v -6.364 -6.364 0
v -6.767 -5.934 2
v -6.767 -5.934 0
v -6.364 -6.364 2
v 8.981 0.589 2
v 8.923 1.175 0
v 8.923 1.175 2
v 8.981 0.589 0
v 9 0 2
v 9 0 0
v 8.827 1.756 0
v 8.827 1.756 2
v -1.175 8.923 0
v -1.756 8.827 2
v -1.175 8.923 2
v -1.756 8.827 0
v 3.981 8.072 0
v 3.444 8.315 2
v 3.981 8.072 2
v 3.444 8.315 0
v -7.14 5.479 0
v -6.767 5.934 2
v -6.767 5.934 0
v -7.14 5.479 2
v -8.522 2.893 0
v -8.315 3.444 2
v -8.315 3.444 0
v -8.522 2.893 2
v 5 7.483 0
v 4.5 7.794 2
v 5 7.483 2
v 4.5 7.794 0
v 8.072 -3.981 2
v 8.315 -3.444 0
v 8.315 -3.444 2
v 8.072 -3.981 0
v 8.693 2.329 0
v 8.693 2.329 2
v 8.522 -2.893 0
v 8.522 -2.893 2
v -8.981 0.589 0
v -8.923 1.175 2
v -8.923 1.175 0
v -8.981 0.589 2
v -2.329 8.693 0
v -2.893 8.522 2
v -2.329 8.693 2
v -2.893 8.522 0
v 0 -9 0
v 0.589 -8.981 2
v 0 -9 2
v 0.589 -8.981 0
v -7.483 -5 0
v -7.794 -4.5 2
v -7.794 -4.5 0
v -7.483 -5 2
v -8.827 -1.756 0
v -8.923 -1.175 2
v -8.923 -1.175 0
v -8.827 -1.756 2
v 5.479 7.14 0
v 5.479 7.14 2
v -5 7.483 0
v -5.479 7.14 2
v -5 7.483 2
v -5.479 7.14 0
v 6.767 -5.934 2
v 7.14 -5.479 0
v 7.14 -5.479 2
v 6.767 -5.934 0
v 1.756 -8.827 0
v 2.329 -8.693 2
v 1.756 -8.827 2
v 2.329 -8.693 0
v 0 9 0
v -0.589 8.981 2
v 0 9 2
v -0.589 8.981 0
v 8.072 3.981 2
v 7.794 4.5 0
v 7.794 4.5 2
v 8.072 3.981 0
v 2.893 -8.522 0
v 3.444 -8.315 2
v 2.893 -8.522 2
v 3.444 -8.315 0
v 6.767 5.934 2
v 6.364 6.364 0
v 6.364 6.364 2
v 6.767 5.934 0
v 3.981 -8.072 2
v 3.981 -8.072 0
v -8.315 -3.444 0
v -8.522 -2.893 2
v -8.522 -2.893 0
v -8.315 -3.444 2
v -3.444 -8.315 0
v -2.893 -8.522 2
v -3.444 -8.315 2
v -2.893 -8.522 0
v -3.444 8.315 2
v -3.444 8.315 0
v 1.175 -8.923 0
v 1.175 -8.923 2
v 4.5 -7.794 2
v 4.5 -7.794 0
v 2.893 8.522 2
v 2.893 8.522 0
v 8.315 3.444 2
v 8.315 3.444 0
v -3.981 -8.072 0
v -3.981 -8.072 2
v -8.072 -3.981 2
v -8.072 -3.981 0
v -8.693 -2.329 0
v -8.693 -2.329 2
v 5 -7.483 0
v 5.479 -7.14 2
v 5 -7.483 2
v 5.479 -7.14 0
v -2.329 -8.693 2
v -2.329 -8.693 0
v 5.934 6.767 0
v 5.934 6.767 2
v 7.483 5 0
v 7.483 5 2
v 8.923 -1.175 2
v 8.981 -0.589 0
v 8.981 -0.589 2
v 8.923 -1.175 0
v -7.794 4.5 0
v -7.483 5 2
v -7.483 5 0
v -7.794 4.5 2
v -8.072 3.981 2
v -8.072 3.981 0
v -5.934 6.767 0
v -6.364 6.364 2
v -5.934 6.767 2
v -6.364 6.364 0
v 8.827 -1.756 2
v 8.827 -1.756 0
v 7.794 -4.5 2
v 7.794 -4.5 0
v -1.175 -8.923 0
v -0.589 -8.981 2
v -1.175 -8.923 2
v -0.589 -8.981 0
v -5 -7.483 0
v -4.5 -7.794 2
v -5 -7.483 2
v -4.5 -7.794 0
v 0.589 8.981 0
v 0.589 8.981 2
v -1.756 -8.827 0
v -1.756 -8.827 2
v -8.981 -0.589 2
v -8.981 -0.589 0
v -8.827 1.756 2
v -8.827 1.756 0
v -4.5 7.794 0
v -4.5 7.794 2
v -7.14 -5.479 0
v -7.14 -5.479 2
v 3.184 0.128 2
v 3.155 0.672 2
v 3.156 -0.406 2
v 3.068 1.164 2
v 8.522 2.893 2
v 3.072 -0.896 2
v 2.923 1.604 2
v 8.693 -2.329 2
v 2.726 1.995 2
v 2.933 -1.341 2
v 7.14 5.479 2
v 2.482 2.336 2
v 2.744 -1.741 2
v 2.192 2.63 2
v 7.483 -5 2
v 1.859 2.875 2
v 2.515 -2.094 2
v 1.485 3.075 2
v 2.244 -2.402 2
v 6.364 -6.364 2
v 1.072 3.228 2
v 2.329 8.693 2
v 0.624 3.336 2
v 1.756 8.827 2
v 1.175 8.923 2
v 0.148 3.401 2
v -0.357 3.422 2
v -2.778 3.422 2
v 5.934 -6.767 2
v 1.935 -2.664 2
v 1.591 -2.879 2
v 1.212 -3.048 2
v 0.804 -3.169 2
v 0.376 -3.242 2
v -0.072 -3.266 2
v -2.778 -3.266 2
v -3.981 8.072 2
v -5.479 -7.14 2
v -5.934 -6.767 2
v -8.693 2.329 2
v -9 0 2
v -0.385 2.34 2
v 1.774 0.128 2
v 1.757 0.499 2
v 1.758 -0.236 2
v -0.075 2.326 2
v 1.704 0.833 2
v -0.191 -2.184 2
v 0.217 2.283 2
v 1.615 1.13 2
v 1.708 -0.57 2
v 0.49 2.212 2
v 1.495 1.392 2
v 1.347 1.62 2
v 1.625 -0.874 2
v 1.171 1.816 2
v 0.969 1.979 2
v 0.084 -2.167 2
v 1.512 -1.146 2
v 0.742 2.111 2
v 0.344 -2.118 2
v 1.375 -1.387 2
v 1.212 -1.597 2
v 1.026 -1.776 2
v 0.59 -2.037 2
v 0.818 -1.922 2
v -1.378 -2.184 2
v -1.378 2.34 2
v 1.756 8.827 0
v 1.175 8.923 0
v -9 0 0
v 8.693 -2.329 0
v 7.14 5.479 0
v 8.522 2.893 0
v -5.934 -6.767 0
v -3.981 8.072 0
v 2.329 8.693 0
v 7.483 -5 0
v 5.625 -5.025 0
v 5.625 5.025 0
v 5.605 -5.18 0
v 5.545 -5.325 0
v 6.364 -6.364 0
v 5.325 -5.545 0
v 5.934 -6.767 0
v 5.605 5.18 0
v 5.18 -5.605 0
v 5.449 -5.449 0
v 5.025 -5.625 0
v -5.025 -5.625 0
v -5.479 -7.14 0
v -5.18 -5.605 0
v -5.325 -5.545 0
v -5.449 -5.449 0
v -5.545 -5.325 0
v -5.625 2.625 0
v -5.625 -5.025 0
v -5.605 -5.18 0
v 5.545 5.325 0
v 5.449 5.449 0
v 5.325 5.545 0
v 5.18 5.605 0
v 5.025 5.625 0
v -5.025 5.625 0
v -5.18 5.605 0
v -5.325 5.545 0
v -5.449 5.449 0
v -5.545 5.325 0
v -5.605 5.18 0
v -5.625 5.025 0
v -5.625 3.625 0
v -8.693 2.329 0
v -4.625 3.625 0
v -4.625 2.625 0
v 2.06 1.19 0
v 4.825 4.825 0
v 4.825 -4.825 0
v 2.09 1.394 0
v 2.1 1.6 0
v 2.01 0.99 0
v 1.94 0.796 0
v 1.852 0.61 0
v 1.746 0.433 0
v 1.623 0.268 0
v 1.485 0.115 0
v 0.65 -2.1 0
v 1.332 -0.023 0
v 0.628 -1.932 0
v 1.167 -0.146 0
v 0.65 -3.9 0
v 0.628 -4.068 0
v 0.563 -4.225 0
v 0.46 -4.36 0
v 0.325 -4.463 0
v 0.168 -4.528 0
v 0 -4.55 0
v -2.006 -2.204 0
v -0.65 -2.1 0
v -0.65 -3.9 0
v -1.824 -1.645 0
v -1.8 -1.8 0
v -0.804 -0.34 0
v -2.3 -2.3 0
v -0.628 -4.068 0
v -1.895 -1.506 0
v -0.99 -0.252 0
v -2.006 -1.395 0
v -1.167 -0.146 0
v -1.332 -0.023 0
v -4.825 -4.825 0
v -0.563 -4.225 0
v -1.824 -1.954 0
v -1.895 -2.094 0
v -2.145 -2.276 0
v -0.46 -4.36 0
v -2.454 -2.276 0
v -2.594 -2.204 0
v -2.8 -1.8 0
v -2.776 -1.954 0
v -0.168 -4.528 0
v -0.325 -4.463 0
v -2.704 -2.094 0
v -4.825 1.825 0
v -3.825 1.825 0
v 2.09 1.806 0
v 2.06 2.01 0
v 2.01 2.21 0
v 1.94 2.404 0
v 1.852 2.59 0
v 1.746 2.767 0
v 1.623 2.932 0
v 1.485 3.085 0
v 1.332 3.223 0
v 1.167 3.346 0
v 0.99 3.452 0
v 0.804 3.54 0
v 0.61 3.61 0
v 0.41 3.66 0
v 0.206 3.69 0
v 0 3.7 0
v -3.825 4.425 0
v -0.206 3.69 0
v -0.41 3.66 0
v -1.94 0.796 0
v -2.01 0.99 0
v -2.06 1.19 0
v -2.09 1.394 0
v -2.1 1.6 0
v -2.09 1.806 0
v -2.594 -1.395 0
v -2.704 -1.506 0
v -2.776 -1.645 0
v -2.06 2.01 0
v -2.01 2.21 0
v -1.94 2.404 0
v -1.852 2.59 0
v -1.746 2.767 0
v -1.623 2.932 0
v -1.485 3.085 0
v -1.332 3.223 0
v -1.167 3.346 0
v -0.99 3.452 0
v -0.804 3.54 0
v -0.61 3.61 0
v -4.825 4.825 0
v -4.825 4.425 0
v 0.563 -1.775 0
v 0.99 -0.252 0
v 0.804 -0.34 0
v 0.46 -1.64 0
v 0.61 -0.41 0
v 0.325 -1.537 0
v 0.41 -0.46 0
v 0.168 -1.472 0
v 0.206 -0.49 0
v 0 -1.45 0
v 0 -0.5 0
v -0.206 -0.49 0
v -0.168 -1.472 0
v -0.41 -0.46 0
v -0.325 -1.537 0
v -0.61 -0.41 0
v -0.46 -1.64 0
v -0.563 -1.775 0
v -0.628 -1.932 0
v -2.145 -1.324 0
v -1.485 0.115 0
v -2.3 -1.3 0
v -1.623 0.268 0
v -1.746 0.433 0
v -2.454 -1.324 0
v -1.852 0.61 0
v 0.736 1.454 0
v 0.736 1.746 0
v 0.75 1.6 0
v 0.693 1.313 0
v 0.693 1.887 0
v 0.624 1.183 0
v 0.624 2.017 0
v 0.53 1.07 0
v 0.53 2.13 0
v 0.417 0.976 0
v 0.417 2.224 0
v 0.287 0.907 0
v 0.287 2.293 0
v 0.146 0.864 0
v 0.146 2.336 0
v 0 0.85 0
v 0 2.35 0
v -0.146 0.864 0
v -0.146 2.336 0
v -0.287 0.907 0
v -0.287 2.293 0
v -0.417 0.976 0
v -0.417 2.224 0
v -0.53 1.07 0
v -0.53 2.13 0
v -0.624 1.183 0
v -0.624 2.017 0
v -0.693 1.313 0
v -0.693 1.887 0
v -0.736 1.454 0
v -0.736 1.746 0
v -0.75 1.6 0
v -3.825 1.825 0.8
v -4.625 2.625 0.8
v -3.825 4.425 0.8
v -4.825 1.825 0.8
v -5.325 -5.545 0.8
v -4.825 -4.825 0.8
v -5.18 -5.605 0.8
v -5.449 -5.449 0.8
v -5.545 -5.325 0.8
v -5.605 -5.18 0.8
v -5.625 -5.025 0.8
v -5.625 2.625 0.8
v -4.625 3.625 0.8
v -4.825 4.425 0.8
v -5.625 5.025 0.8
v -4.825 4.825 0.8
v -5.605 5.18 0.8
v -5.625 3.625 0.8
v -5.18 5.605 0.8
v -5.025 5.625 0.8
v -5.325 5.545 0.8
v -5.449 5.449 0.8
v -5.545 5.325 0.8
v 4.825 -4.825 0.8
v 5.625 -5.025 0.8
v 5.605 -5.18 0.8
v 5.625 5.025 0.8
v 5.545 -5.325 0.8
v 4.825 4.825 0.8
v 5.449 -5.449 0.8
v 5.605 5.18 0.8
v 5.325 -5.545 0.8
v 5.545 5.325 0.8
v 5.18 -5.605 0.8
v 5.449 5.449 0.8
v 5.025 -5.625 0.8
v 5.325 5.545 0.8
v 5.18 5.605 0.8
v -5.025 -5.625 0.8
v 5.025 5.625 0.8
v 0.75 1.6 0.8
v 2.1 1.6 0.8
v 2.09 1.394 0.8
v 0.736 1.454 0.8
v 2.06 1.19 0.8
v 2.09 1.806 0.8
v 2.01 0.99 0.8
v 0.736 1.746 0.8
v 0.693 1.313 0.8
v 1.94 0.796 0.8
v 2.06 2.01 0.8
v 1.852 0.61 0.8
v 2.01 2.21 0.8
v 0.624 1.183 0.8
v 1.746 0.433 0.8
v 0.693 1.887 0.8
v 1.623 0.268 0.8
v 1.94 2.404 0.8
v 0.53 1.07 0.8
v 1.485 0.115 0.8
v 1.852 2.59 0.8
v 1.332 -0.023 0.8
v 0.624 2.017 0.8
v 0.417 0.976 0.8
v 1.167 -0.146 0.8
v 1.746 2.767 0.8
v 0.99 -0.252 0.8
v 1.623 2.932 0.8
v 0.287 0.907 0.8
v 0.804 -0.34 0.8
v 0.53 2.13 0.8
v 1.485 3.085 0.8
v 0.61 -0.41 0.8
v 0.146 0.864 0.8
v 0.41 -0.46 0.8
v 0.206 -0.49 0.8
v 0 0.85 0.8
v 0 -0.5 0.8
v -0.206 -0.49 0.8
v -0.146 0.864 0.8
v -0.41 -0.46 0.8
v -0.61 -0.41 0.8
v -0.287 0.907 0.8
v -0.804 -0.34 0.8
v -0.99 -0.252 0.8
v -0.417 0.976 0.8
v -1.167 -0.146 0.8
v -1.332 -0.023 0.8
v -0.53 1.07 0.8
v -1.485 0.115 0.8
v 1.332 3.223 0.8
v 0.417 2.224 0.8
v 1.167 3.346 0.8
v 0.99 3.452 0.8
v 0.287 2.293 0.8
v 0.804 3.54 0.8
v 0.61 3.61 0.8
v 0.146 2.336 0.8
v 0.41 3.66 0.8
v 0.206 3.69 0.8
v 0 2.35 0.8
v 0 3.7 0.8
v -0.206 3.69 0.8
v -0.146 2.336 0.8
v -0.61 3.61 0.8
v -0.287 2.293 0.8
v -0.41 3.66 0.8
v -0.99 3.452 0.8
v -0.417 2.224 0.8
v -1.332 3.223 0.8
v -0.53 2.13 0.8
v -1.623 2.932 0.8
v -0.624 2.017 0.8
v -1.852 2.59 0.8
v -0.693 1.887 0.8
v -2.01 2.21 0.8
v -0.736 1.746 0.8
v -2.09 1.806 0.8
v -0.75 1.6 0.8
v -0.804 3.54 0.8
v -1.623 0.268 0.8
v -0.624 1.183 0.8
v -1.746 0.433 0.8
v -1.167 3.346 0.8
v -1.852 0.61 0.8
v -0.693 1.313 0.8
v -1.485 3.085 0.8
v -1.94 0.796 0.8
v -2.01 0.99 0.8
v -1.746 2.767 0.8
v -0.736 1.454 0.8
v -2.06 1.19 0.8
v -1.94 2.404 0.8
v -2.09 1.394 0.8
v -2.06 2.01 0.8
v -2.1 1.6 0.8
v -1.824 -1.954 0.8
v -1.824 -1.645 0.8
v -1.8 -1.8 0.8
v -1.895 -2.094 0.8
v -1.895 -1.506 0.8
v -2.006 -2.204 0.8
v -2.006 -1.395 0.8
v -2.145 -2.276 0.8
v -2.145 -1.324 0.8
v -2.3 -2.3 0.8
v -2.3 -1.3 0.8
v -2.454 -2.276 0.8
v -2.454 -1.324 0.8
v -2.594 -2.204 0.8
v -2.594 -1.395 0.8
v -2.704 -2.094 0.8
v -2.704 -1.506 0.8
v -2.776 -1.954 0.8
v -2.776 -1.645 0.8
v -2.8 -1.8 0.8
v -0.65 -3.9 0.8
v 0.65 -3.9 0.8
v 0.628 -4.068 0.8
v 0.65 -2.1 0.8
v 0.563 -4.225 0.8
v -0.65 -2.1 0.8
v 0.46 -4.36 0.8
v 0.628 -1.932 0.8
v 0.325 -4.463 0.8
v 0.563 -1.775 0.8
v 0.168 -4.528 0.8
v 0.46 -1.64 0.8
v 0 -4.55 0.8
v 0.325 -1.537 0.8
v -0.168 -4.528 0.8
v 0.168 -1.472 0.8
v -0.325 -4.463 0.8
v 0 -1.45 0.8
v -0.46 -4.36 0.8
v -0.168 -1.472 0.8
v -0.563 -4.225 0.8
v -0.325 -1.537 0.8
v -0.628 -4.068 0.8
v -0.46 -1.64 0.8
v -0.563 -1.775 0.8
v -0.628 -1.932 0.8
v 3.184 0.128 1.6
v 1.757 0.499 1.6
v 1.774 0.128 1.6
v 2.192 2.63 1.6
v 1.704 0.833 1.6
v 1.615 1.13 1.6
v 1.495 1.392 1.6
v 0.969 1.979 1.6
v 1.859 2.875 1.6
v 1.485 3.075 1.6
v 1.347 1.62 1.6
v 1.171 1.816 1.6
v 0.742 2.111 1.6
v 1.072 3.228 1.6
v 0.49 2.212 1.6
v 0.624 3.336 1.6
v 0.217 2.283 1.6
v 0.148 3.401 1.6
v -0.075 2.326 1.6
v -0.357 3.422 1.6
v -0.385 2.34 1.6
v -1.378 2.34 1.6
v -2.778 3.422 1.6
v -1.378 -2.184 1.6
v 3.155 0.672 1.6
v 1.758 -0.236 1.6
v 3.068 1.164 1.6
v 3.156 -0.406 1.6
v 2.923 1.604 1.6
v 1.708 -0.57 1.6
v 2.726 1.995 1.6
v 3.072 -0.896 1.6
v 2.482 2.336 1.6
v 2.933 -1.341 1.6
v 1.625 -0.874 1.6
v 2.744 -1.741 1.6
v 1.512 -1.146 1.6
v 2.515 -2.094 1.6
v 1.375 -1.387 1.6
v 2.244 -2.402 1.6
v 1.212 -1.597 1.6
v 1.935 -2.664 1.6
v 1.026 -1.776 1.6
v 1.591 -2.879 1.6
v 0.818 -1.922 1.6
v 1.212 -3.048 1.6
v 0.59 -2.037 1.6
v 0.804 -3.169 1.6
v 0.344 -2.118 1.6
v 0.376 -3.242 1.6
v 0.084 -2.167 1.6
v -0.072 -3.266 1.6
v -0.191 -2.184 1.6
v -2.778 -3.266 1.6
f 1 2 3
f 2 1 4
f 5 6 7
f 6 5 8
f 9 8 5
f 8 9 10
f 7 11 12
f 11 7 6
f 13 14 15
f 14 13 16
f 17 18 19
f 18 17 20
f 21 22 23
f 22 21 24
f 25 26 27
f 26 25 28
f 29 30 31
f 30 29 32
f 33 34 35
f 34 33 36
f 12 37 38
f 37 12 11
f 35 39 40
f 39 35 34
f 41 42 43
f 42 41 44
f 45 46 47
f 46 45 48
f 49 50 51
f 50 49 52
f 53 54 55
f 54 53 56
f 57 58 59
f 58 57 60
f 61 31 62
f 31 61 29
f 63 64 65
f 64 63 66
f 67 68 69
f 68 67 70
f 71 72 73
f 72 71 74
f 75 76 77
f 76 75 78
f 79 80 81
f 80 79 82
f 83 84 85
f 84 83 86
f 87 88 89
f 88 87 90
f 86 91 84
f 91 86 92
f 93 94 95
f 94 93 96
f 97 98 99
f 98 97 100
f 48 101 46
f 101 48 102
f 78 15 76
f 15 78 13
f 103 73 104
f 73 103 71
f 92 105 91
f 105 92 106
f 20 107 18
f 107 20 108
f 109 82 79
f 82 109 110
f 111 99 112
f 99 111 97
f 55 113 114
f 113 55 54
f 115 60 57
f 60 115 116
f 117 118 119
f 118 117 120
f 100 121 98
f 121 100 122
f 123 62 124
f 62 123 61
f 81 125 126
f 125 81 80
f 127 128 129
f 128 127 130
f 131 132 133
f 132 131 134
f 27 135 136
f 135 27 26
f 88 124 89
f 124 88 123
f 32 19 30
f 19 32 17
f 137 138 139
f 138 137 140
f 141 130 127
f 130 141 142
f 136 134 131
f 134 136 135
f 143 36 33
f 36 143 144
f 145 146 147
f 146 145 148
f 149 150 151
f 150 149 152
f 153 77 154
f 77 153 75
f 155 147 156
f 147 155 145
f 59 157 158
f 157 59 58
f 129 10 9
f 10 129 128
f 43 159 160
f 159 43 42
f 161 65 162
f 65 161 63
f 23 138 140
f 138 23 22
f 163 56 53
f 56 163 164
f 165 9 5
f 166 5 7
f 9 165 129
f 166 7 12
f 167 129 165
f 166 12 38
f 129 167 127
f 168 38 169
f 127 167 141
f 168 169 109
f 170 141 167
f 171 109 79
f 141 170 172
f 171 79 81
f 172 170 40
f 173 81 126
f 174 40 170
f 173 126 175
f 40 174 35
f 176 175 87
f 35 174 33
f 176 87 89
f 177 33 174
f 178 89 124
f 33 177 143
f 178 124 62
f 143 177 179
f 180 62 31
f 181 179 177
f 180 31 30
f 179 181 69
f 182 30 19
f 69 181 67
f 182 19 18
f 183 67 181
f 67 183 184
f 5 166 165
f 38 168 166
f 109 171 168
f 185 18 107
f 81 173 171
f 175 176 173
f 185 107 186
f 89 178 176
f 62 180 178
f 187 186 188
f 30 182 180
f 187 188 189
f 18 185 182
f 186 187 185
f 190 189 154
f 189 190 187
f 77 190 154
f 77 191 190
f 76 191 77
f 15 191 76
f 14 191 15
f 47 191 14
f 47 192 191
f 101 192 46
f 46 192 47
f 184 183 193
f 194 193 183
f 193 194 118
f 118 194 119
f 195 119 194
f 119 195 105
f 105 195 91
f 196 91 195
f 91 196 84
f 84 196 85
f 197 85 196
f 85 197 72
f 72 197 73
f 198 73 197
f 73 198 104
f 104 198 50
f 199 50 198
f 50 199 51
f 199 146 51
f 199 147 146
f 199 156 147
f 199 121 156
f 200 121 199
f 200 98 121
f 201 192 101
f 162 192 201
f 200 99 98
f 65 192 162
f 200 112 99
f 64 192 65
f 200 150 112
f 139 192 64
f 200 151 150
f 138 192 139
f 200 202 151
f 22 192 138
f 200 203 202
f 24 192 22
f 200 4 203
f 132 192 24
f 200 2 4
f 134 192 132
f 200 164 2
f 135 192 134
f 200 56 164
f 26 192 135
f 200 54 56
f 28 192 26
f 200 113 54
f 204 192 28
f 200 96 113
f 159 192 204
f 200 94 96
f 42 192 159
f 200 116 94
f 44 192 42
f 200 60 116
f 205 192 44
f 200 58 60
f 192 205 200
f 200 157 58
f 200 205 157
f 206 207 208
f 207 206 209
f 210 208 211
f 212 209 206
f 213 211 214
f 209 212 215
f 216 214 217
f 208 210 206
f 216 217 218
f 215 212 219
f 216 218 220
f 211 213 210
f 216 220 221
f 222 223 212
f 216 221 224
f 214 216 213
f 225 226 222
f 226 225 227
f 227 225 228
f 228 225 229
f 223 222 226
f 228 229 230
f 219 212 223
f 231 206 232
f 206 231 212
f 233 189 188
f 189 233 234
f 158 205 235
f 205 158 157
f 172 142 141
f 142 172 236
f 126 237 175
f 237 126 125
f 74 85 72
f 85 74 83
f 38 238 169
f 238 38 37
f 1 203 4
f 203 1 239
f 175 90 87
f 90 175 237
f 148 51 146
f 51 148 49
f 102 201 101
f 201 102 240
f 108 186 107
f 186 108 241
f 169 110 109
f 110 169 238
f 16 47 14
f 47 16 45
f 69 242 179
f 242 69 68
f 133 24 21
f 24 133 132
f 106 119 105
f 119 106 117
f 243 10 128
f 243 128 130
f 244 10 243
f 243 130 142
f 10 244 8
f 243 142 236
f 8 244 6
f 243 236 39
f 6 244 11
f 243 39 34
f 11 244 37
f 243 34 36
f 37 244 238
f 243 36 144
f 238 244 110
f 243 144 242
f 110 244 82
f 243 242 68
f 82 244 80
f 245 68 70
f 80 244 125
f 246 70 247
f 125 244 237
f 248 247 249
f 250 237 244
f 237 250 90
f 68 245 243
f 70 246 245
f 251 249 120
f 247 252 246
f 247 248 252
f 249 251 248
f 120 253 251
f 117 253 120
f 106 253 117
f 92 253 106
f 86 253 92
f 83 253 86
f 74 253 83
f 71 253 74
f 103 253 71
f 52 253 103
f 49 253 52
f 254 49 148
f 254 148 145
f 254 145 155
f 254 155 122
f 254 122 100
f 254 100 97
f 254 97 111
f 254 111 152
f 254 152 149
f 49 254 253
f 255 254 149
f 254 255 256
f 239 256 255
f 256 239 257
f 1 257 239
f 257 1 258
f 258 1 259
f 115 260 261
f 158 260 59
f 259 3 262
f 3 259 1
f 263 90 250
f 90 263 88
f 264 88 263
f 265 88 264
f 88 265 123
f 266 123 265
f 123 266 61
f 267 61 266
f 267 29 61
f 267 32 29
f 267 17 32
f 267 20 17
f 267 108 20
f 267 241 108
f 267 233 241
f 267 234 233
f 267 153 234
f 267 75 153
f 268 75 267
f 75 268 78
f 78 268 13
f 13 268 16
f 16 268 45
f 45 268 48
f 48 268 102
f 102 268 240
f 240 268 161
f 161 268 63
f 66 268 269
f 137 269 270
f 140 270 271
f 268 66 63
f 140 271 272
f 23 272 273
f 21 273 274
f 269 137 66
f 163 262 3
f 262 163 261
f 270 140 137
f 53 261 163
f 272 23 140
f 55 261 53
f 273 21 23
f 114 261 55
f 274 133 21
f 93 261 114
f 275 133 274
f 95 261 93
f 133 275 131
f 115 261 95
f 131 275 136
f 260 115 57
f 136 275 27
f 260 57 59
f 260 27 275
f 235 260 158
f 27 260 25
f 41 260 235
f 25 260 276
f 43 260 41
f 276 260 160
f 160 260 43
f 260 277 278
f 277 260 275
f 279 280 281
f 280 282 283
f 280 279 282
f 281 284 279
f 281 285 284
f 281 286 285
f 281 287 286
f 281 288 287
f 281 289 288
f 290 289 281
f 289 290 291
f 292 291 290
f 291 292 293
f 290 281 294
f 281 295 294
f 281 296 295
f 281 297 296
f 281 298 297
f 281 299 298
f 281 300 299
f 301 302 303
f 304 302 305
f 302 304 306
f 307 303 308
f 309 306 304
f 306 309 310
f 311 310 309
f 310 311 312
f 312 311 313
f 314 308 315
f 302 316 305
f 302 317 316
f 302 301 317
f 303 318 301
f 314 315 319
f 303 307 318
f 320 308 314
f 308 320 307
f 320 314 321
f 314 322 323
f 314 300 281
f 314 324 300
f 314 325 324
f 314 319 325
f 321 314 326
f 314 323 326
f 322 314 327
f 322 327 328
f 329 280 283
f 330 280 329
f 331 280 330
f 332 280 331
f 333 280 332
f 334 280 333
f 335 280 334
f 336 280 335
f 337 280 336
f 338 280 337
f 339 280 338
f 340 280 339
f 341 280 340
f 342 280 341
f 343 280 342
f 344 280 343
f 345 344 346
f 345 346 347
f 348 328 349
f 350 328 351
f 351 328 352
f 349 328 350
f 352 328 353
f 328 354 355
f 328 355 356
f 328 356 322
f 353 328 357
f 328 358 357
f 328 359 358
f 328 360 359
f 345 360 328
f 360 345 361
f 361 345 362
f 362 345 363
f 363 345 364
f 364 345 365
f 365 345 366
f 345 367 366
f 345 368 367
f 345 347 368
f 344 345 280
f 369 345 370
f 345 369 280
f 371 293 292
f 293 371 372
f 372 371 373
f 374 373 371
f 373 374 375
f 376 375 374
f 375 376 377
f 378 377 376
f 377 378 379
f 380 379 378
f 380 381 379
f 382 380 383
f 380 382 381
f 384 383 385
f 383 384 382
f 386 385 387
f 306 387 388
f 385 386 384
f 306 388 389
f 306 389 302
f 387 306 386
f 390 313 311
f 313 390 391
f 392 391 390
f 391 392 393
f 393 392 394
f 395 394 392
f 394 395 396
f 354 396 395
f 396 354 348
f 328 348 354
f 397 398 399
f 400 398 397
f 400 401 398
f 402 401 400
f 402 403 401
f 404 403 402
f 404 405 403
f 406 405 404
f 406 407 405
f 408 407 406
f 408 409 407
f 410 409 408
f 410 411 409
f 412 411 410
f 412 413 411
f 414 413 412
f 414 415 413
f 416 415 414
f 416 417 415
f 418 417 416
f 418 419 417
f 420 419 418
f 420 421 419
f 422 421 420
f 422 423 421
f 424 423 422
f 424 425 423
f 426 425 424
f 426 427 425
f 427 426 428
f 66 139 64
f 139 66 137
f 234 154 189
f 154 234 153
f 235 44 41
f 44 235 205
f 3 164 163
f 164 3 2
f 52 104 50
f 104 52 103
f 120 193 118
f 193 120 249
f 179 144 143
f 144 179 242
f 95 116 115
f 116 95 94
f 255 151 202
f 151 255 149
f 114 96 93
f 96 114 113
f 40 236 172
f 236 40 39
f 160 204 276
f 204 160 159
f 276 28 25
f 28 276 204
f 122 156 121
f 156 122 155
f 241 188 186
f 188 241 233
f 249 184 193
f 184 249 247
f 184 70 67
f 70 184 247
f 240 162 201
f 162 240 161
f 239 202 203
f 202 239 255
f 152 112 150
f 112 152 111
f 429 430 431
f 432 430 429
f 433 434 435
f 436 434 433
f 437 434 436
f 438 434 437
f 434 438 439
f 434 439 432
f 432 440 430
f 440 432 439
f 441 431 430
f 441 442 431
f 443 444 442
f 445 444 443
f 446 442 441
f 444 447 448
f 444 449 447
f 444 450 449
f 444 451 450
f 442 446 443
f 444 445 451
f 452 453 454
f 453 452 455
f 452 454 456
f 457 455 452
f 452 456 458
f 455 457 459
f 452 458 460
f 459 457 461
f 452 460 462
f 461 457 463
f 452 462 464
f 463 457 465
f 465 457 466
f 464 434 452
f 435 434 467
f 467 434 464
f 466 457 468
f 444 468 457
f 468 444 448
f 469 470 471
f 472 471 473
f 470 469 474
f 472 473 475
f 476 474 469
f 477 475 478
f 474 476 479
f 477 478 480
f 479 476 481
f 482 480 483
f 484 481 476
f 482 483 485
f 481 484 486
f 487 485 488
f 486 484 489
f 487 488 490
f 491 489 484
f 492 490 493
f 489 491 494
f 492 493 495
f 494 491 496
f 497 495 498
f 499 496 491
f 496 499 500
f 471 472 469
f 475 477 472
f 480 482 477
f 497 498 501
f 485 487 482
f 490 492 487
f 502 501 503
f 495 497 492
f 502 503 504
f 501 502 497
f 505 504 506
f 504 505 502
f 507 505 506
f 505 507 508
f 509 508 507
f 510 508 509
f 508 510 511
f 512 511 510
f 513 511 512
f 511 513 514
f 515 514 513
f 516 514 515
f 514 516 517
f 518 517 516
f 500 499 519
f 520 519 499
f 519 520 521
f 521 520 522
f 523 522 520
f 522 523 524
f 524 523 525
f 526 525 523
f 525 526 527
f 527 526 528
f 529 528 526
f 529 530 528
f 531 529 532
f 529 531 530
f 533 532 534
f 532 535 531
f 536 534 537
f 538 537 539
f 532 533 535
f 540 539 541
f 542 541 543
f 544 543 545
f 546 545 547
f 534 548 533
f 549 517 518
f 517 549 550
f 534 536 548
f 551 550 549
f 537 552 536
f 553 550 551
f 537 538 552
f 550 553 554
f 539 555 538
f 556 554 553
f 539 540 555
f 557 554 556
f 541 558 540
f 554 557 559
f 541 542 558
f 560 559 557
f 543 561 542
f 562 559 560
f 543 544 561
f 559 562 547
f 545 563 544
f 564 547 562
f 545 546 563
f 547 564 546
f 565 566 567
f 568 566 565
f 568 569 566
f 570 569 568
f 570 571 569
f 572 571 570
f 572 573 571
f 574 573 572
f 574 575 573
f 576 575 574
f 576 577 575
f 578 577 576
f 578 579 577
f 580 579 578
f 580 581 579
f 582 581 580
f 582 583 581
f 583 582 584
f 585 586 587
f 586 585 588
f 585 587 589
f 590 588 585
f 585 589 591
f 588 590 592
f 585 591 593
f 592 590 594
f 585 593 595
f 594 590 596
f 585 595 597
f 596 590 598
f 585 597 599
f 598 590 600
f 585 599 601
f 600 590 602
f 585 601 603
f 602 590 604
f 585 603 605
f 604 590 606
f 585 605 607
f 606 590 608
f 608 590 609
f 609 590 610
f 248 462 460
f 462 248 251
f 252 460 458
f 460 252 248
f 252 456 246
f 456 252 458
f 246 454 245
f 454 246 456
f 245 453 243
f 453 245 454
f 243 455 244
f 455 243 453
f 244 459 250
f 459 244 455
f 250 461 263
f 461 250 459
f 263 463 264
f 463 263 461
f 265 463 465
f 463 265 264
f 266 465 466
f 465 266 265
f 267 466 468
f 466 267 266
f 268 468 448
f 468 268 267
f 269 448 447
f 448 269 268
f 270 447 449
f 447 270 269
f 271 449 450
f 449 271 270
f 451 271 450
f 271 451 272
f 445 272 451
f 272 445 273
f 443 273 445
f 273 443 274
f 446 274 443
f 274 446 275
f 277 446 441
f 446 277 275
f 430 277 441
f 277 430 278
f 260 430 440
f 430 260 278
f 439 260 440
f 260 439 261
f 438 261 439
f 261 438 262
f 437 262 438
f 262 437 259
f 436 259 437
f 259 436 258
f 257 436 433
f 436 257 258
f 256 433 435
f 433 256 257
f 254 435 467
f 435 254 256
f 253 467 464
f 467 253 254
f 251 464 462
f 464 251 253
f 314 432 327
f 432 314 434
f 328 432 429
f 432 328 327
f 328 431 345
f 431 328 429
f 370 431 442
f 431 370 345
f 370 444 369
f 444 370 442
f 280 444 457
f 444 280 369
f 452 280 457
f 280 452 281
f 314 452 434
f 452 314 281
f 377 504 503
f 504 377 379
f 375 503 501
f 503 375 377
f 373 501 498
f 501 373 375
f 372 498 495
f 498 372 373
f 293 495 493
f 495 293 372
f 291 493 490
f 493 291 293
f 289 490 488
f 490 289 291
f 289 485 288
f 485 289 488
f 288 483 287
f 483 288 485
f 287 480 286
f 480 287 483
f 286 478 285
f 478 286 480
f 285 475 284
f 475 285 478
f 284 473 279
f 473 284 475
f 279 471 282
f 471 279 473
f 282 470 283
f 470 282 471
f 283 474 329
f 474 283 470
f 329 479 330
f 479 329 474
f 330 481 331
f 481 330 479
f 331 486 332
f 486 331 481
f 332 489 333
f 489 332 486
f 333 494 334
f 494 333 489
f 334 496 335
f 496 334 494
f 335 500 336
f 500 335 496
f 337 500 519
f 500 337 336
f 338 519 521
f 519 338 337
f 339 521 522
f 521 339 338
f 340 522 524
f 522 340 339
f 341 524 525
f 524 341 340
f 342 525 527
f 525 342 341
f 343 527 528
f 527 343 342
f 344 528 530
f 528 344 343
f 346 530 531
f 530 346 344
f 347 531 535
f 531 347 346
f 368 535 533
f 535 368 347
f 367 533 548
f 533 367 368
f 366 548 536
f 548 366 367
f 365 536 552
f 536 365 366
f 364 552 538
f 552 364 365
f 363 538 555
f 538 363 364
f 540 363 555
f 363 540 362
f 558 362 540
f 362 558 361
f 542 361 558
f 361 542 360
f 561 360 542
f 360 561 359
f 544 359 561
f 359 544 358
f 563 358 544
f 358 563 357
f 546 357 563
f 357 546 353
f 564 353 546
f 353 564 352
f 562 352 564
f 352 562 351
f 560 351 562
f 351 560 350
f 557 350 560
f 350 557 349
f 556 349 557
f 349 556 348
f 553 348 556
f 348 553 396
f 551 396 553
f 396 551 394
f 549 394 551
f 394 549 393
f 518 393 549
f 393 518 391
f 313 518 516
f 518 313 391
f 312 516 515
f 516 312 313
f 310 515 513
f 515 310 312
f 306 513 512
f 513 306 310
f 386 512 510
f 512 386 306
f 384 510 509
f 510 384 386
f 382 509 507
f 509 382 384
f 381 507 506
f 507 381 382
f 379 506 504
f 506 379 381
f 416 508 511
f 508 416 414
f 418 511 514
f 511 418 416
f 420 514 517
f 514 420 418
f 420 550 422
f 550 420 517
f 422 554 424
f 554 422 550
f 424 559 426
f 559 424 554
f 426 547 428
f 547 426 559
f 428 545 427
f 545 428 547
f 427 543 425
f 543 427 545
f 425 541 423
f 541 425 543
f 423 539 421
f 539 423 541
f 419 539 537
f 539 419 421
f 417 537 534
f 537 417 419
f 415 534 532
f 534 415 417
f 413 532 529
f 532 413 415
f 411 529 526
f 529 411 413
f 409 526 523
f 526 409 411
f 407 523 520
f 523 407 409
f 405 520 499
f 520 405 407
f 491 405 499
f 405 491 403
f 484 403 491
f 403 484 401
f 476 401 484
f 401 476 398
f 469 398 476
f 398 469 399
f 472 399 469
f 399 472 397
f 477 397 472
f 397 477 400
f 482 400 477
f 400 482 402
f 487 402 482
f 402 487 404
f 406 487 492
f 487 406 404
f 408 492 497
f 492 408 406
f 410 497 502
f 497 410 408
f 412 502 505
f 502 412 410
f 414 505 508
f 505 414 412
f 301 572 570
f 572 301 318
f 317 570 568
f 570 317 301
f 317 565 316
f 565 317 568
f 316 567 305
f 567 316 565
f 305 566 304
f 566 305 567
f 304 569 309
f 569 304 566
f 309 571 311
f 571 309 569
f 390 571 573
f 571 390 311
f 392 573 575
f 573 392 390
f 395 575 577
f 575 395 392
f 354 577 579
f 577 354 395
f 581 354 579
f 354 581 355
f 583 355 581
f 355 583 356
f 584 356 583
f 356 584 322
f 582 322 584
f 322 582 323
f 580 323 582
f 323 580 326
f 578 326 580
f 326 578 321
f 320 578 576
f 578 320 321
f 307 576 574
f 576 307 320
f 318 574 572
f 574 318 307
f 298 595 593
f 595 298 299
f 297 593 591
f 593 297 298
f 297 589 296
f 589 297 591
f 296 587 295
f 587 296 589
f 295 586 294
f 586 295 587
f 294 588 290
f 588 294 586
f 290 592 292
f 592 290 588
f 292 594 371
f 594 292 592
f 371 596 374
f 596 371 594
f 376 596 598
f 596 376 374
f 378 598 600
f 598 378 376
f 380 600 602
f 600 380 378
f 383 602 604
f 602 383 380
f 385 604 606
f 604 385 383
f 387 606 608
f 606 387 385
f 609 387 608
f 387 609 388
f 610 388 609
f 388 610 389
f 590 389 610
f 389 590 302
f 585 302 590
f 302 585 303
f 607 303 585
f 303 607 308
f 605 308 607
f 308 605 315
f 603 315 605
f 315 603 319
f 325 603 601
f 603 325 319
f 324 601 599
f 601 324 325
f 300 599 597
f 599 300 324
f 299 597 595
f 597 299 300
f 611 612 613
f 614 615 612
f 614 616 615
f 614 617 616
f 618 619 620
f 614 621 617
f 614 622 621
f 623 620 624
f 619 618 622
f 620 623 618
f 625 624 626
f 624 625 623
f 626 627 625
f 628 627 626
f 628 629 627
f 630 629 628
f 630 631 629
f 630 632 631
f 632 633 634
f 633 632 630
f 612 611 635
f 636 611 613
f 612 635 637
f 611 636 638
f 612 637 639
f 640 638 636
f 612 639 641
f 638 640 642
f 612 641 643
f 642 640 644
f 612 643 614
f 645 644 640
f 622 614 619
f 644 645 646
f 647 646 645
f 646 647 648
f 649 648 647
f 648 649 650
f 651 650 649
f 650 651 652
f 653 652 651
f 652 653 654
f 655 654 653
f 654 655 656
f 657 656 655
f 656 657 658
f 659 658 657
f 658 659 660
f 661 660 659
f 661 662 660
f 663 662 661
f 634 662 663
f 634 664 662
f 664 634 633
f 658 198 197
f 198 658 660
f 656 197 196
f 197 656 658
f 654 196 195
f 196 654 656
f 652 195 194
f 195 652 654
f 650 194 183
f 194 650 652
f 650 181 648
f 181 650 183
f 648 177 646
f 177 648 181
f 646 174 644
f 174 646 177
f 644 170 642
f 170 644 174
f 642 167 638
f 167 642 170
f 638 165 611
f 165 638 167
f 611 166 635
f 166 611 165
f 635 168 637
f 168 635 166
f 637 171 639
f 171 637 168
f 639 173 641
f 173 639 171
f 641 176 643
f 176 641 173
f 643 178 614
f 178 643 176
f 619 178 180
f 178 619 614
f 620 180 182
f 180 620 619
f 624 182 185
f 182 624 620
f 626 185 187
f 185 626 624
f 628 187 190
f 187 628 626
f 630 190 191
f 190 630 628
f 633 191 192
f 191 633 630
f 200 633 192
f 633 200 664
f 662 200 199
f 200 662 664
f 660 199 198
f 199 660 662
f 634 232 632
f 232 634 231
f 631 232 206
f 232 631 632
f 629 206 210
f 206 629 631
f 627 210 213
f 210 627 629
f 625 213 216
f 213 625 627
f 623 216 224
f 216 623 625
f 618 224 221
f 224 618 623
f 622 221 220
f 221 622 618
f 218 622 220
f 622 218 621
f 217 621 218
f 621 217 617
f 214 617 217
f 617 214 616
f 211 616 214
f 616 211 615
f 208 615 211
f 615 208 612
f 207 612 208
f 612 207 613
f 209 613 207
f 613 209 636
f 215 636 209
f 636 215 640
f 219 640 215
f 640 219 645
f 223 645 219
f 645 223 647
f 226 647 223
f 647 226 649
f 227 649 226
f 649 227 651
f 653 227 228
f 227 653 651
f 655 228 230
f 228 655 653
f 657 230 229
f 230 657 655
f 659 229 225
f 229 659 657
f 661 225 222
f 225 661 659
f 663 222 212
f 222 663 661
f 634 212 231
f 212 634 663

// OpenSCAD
/* Knob-face logo concepts (2026-11-01): a disk, Commodore-themed, bold enough to print.
 * Theme: the 1541's own medium, the 5¼" disk (jacket, hub hole, head slot, index hole, write-protect notch),
 * drawn in big square pixels like a PETSCII / C64 character cell. No Commodore trademarks.
 * CHECKED (check_logo.py, same limits as the lid labels: islands >= 1.2, plastic >= 0.9, cuts >= 0.65):
 *   D passes. A and C FAIL: 0.75 mm pixels leave 0.75 islands (hub centre, index pillar) and 0.75 strips, and
 *   1.2 mm pixels would leave only 10 across the face, too coarse for hub + slot + notch. Kept for reference only.
 * The knob prints top face down, so the logo is debossed 0.6 into the bed face, as the lid labels are.
 *
 *   logo = "A" pixel outline | "C" pixel solid (the features stand up) | "D" smooth outline
 *   part = "tokens": three Ø18 discs, A C D, 2 mm, letter on the back, printed face down
 *          "2d": the chosen logo flat (for knob() and renders)
 */
logo = "D"; part = "tokens";
PX = 0.75;                 // pixel: 15 px = 11.25 mm, corners inside Ø16 (the knob is Ø18 with ribs)
DEEP = 0.8; T = 2.0;      // as the lid labels

// '#' = debossed. Row 0 is the top (the label end); the head slot is at the bottom.
A = ["###############",
     "#.............#",
     "#.....###...###",
     "#....#####..#..",
     "#....##.##..###",
     "#....#####....#",
     "#.....###.....#",
     "#.............#",
     "#......#..#...#",
     "#.....###.....#",
     "#.....###.....#",
     "#.....###.....#",
     "#......#......#",
     "#.............#",
     "###############"];
C = ["###############",
     "###############",
     "######...######",
     "#####.....###..",
     "#####..#..#####",
     "#####.....#####",
     "######...######",
     "###############",
     "#######.##.####",
     "######...######",
     "######...######",
     "######...######",
     "#######.#######",
     "###############",
     "###############"];   // A inverted inside the jacket (generated from A)

module pixels(m) {
    n = len(m);
    translate([-n * PX / 2, n * PX / 2]) for (r = [0 : n - 1], c = [0 : len(m[r]) - 1])
        if (m[r][c] == "#") translate([c * PX, -(r + 1) * PX]) square(PX + 0.001);
}
module jacket(S) difference() {     // rounded square less the write-protect notch (right edge, near the top)
    offset(r = 0.6, $fn = 24) offset(delta = -0.6) square(S, center = true);
    translate([S / 2 - 1.0, S / 2 - 3.0]) square([2, 1.0]);
}
module smooth() {       // D: the same disk drawn smooth, 0.8 mm strokes
    S = 11.25; W = 0.8;
    difference() { jacket(S); offset(delta = -W) jacket(S); }
    translate([0, 1.6]) difference() { circle(d = 4.2, $fn = 64); circle(d = 1.5, $fn = 32); }   // hub ring
    translate([0, -3.0]) hull() for (y = [-0.9, 0.9]) translate([0, y]) circle(d = 1.3, $fn = 24);   // head slot
    translate([2.3, -1.8]) circle(d = 1.0, $fn = 20);                                       // index hole
}
module logo_2d(l = logo) {
    if (l == "A") pixels(A); else if (l == "C") pixels(C); else smooth();
}

module token(l) difference() {
    cylinder(d = 18, h = T, $fn = 96);
    translate([0, 0, -1]) linear_extrude(1 + DEEP) mirror([1, 0, 0]) logo_2d(l);        // bed face: reads turned over
    translate([0, 0, T - 0.4]) linear_extrude(1) text(l, size = 7, font = "Liberation Sans:style=Bold", halign = "center", valign = "center");
}
if (part == "tokens") token("D");
else logo_2d();
